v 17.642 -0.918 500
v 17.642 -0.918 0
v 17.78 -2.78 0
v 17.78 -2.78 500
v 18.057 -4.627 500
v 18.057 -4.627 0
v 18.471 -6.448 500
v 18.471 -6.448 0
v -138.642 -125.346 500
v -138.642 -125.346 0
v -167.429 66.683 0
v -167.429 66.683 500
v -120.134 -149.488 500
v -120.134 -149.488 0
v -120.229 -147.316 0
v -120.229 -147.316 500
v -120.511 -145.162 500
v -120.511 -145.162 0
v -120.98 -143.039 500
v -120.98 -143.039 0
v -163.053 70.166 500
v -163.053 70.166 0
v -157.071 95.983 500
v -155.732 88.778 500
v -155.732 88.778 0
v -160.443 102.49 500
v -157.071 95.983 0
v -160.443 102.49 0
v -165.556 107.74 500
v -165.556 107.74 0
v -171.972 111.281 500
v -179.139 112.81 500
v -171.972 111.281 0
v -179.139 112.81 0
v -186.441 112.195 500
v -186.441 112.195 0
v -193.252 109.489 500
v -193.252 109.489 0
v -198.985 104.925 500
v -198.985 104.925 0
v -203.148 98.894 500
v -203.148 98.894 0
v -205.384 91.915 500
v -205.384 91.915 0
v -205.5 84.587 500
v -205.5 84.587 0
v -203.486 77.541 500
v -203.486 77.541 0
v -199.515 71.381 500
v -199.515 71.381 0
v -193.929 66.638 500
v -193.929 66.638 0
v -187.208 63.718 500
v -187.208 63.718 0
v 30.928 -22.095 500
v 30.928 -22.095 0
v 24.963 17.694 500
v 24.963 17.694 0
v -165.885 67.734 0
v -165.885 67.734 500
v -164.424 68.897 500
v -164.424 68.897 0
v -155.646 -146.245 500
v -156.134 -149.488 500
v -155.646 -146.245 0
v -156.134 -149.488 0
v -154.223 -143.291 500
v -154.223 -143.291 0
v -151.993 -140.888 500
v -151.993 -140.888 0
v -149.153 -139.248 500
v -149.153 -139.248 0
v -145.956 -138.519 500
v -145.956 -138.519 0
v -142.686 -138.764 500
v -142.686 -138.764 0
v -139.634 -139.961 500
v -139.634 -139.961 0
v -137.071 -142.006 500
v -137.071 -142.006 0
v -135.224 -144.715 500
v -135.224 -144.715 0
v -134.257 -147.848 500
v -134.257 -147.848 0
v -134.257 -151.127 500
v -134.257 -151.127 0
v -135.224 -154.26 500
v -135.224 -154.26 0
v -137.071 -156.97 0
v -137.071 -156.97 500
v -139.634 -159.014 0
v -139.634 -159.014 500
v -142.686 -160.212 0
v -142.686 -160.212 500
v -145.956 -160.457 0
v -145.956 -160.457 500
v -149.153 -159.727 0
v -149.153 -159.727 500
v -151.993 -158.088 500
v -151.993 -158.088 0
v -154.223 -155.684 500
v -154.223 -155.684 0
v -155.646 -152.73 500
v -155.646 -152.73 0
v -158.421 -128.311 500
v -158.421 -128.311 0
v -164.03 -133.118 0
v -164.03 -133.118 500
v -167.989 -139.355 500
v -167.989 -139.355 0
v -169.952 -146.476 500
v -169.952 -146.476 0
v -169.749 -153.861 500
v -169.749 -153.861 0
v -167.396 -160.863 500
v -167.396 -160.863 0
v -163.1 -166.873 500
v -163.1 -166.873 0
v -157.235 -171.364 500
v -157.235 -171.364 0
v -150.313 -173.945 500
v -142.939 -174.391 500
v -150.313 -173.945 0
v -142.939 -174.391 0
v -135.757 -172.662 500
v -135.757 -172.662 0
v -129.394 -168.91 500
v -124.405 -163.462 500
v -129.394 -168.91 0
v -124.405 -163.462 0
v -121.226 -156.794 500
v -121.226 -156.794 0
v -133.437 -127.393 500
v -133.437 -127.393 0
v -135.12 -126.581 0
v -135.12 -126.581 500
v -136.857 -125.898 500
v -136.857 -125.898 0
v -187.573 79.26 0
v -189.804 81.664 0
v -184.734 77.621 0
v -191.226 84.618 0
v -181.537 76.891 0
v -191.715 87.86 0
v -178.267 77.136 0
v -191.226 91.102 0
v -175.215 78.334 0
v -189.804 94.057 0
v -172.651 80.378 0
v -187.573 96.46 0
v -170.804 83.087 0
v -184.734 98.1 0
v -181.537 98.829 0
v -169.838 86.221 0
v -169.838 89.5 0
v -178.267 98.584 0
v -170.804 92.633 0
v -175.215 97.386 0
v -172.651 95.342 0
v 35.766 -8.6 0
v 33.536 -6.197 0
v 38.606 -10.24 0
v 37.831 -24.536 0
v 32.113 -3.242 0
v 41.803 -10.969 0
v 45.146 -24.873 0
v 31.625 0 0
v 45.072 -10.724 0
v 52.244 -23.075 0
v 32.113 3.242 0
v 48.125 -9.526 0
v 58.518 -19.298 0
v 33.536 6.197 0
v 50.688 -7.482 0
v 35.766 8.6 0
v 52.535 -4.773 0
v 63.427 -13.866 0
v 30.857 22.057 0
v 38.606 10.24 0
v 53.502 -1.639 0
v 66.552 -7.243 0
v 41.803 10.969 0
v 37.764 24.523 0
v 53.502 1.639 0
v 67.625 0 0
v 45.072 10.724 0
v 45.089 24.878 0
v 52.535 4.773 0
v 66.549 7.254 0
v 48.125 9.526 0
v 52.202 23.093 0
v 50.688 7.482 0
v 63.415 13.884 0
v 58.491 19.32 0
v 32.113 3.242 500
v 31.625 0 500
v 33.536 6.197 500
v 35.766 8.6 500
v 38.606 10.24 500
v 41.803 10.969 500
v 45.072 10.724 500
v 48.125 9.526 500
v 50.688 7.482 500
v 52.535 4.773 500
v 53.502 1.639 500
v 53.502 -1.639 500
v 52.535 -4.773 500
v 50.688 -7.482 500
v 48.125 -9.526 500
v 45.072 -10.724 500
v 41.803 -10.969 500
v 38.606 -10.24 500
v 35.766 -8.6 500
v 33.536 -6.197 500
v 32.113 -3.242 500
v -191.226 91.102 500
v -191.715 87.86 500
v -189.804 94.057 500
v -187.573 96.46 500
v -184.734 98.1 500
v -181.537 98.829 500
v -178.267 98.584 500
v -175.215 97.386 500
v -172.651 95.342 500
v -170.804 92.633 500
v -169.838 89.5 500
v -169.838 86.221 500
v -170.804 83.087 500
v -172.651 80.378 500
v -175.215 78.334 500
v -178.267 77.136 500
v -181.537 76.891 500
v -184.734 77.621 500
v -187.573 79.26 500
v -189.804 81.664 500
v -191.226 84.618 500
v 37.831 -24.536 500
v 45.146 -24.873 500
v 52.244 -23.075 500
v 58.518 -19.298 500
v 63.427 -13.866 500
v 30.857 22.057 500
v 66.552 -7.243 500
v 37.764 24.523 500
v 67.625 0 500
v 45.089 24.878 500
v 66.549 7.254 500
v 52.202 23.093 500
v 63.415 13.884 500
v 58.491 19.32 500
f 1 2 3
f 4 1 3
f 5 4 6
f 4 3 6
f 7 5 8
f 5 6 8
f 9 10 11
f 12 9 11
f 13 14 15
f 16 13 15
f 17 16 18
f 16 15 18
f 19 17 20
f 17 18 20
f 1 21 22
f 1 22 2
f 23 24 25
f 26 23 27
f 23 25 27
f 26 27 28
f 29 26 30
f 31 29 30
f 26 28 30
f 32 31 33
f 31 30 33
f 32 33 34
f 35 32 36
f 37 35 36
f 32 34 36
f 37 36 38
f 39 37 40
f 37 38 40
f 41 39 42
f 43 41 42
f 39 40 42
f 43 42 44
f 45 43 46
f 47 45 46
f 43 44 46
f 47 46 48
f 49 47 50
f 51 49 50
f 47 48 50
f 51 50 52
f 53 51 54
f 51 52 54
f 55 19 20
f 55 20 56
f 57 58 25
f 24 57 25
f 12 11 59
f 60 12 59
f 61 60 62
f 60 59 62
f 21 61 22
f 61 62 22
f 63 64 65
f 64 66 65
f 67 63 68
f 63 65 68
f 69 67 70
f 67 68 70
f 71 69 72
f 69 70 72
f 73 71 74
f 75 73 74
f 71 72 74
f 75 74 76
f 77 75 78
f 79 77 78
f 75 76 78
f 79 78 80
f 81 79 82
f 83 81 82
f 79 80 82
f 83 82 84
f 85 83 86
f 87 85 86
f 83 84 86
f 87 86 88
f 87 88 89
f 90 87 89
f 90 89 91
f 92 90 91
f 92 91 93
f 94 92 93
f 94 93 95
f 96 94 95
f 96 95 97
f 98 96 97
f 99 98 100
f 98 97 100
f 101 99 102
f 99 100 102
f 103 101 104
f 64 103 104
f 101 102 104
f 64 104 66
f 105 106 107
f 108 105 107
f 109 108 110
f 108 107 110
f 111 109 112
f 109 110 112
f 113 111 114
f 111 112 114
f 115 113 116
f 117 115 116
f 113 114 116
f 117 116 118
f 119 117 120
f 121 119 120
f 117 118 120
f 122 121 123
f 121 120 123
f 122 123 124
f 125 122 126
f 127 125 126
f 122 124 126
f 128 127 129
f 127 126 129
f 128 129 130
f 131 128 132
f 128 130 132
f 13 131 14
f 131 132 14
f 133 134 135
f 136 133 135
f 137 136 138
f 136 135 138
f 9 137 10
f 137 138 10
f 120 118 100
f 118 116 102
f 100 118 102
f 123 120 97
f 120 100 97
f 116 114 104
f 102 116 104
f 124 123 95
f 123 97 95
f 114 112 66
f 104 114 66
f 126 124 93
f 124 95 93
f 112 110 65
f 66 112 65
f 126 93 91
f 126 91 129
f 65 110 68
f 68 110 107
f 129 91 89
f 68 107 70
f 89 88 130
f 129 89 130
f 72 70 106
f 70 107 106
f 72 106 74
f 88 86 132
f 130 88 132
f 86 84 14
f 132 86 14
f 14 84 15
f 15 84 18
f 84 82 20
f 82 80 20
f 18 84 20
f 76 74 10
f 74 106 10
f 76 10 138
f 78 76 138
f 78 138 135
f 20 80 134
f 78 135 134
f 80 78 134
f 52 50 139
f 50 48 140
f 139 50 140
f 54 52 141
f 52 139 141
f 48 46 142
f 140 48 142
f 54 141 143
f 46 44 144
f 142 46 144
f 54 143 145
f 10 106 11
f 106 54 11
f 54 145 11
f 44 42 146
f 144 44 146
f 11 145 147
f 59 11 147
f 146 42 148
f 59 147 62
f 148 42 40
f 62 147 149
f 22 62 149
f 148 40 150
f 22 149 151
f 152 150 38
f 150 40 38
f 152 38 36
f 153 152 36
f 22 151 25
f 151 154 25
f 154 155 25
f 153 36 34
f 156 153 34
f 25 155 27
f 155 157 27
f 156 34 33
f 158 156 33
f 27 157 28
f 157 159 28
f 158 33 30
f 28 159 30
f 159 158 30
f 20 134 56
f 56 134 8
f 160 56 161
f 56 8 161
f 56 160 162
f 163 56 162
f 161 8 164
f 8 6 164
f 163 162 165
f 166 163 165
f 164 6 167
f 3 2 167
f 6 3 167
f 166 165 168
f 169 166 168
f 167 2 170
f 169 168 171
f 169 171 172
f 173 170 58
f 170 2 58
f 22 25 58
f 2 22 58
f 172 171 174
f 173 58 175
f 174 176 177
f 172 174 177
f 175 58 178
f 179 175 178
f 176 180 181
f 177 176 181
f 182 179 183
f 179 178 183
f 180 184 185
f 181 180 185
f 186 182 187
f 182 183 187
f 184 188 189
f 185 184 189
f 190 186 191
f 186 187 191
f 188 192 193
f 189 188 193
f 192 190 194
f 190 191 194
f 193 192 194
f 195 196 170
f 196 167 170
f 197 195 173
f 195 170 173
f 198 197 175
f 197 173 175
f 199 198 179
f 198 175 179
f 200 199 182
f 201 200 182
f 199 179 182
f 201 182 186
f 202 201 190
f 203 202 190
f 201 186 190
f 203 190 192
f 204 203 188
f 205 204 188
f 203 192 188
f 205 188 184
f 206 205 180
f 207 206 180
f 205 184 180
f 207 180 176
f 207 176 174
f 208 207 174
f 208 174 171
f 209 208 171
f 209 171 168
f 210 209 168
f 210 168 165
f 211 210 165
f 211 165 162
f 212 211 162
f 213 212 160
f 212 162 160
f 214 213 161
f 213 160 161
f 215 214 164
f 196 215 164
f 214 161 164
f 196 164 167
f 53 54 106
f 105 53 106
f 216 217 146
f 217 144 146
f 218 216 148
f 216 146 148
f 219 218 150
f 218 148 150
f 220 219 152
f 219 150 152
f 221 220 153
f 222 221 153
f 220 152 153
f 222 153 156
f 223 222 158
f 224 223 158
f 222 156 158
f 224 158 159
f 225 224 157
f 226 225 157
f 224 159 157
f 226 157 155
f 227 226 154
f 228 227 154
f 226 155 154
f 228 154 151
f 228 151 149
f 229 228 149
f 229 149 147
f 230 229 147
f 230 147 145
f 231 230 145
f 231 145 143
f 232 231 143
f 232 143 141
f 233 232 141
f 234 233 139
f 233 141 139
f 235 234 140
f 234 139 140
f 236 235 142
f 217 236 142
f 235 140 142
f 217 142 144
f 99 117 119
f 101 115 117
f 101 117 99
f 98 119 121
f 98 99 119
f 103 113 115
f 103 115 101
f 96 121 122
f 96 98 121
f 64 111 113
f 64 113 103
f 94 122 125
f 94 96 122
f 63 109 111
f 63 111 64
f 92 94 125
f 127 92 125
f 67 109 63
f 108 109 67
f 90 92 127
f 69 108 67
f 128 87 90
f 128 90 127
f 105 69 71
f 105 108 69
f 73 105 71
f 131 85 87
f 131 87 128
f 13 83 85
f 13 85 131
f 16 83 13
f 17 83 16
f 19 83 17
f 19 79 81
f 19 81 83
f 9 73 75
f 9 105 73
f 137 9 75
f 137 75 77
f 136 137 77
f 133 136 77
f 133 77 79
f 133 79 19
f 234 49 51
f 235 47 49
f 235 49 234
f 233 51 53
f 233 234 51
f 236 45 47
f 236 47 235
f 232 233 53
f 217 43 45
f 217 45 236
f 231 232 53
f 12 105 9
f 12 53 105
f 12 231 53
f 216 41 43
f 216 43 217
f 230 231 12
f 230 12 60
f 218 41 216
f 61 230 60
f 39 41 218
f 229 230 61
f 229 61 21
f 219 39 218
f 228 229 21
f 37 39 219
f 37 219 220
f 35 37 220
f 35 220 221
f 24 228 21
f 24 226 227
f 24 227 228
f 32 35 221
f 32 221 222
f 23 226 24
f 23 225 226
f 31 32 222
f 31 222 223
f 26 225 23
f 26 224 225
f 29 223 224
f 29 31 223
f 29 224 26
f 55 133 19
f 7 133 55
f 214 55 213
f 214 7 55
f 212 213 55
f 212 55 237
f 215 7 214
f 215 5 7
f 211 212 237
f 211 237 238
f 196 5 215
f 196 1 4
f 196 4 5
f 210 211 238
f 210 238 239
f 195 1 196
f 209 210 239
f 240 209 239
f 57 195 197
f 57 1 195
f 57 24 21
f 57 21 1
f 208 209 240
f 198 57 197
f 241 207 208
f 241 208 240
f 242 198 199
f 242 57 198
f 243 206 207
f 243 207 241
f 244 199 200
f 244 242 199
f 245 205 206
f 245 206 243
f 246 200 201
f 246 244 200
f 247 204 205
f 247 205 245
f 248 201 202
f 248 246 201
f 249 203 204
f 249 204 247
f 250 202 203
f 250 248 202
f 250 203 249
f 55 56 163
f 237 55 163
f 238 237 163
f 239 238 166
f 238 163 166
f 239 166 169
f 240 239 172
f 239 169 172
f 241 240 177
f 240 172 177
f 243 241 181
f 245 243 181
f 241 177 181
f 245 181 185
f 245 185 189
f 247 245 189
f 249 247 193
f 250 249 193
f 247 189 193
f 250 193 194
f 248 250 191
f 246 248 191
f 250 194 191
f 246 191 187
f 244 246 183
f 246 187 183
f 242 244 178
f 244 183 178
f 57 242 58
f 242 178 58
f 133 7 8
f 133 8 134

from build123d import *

# Parameters (mm, degrees)
F2_DEPTH = 500
F4_D     = 22
F4_DEPTH = 500
F4_TIP   = 6.6094668093


with BuildPart() as f2:
    # F1 (on Top) → F2 (new body)
    with BuildSketch(Plane.XY):
        with BuildLine():
            ThreePointArc((-163.0534820056, 70.1662666553), (-157.6223484782, 78.2824576852), (-155.7149531136, 87.8601197772))
            ThreePointArc((-155.7149531136, 87.8601197772), (-155.7191665297, 88.3190893279), (-155.7318053575, 88.7779041722))
            ThreePointArc((-155.7318053575, 88.7779041722), (-196.2865938282, 107.4183406948), (-187.2075438541, 63.7179105685))
            ThreePointArc((-187.2075438541, 63.7179105685), (-177.008627135, 63.1363832526), (-167.4285546343, 66.6829713514))
            ThreePointArc((-167.4285546343, 66.6829713514), (-165.1433123991, 68.3018988597), (-163.0534820056, 70.1662666553))
        make_face()
        with BuildLine():
            ThreePointArc((-167.4285546343, 66.6829713514), (-177.008627135, 63.1363832526), (-187.2075438541, 63.7179105685))
            Line((-187.2075438541, 63.7179105685), (-158.4206221982, -128.3106024335))
            ThreePointArc((-158.4206221982, -128.3106024335), (-148.8405496975, -124.7640143347), (-138.6416329785, -125.3455416506))
            Line((-138.6416329785, -125.3455416506), (-167.4285546343, 66.6829713514))
        make_face()
        with BuildLine():
            ThreePointArc((-138.6416329785, -125.3455416506), (-148.8405496975, -124.7640143347), (-158.4206221982, -128.3106024335))
            ThreePointArc((-158.4206221982, -128.3106024335), (-157.2346377204, -171.364221804), (-120.1342237189, -149.4877508594))
            ThreePointArc((-120.1342237189, -149.4877508594), (-120.346610419, -146.2359472222), (-120.9801618704, -143.0393947726))
            ThreePointArc((-120.9801618704, -143.0393947726), (-125.5760028014, -133.9161101448), (-133.437474442, -127.3928180386))
            ThreePointArc((-133.437474442, -127.3928180386), (-135.9821279087, -126.2232039632), (-138.6416329785, -125.3455416506))
        make_face()
        with BuildLine():
            ThreePointArc((30.9279478124, -22.0949328208), (23.0664761717, -15.5716407145), (18.4706352408, -6.4483560868))
            Line((18.4706352408, -6.4483560868), (-133.437474442, -127.3928180386))
            ThreePointArc((-133.437474442, -127.3928180386), (-125.5760028014, -133.9161101448), (-120.9801618704, -143.0393947726))
            Line((-120.9801618704, -143.0393947726), (30.9279478124, -22.0949328208))
        make_face()
        with BuildLine():
            ThreePointArc((67.6246970892, 0), (52.2023591813, 23.0926046355), (24.9632259812, 17.6938531219))
            ThreePointArc((24.9632259812, 17.6938531219), (19.3601501931, 9.1520958101), (17.6415493331, -0.917784395))
            ThreePointArc((17.6415493331, -0.917784395), (17.9009605645, -3.7063259786), (18.4706352408, -6.4483560868))
            ThreePointArc((18.4706352408, -6.4483560868), (23.0664761717, -15.5716407145), (30.9279478124, -22.0949328208))
            ThreePointArc((30.9279478124, -22.0949328208), (55.5200696716, -21.417501394), (67.6246970892, 0))
        make_face()
        with BuildLine():
            ThreePointArc((-155.7318053575, 88.7779041722), (-155.7191665297, 88.3190893279), (-155.7149531136, 87.8601197772))
            ThreePointArc((-155.7149531136, 87.8601197772), (-157.6223484782, 78.2824576852), (-163.0534820056, 70.1662666553))
            Line((-163.0534820056, 70.1662666553), (17.6415493331, -0.917784395))
            ThreePointArc((17.6415493331, -0.917784395), (19.3601501931, 9.1520958101), (24.9632259812, 17.6938531219))
            Line((24.9632259812, 17.6938531219), (-155.7318053575, 88.7779041722))
        make_face()
    extrude(amount=F2_DEPTH)

    # F4
    with Locations(Plane.XY.offset(500)):
        with Locations((-180.7149531136, 87.8601197772), (42.6246970892, 0), (-145.1342237189, -149.4877508594)):
            Hole(F4_D / 2, depth=F4_DEPTH)
            with Locations((0, 0, -(F4_DEPTH + F4_TIP / 2))):  # 118° drill point
                Cone(0, F4_D / 2, F4_TIP, mode=Mode.SUBTRACT)


solid = f2.part
